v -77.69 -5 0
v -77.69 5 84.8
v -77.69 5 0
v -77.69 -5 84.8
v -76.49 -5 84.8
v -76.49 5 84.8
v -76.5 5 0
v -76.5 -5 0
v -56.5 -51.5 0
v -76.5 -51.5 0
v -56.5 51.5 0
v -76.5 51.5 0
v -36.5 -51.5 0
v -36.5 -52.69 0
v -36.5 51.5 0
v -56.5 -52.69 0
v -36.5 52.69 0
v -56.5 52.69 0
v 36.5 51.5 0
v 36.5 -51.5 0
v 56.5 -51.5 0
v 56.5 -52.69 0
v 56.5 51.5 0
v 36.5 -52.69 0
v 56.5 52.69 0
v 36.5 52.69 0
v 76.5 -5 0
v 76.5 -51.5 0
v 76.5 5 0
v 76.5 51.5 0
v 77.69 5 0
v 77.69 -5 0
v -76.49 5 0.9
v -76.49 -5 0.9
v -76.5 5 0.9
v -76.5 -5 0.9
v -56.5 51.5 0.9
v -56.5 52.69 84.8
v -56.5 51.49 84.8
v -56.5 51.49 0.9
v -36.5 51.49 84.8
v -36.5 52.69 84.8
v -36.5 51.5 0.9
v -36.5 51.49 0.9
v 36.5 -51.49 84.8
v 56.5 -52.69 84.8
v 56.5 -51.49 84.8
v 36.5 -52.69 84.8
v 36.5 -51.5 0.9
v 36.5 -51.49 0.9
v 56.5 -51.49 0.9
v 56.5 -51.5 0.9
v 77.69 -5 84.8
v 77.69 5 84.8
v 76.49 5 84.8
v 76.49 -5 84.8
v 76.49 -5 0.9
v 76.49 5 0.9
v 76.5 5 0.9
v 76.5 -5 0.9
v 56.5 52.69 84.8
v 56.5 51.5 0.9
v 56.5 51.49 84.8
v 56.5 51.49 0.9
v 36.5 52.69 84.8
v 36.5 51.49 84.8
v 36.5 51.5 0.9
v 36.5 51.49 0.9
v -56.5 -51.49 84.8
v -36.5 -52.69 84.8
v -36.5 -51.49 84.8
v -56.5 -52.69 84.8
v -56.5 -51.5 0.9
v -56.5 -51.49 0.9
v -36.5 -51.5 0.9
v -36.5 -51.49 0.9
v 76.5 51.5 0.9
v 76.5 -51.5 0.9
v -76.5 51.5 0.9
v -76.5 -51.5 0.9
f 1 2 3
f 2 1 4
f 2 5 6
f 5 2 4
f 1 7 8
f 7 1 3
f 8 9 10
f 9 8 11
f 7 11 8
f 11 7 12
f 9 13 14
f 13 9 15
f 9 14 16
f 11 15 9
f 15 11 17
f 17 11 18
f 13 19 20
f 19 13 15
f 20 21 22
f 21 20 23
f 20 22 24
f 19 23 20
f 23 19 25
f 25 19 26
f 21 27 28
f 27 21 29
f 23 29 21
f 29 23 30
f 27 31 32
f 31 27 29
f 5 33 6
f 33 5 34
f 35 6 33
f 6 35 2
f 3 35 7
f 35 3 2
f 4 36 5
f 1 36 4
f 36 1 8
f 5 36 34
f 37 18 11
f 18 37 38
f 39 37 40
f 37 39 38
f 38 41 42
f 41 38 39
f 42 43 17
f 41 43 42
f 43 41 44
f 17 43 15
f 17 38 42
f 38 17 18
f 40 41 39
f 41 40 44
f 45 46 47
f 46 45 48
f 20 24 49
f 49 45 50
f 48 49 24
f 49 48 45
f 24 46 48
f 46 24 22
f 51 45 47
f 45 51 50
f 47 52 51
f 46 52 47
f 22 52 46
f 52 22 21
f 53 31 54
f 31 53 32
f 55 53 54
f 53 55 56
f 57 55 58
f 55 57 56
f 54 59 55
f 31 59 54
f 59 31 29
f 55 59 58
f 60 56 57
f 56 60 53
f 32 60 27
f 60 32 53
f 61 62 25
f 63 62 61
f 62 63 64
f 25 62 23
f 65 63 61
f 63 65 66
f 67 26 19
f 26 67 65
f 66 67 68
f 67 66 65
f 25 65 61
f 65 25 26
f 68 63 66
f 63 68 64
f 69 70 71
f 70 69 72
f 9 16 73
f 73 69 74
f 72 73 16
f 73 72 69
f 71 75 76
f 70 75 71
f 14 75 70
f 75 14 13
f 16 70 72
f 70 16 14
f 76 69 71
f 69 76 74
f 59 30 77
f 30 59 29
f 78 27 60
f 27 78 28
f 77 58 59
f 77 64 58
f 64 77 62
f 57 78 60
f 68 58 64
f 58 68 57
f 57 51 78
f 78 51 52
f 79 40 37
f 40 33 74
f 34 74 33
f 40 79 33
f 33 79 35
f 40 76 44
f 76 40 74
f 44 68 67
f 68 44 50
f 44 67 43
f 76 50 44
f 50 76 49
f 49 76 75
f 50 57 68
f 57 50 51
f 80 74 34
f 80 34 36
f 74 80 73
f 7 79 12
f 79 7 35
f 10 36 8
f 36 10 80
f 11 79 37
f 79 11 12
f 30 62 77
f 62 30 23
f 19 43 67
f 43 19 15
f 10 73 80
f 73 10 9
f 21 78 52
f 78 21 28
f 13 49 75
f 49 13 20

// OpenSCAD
// -*- mode: SCAD ; c-file-style: "ellemtel" ; coding: utf-8 -*-
//
// correctly sized simple shape to stack four picture 135 type film strips
//
// © 2018 Roland Sieker <ospalh@gmail.com>
// Licence: CC-BY-SA 4.0


// … to preview. You will get all parts when you click “Create Thing”.
part = "stack"; // [stack: Stapler, lid: Deckel]

// Set this to “render” and click on “Create Thing” when done with the setup.
preview = 1; // [0:render, 1:preview]
// not needed


l1 = 150;
ex = 3;
num = 1;
lld = l1*num;
ll = lld + ex;
ey = 1;
w1 = 102;
wst = w1+ey; // 9.2 mm + clearance
wld = w1-ey; // Make it fit between the plates without problems

w = 1.2;  // Wall width

h = 83; // I have a lot of film strips i want to stack. I mean, a *lot*.
epl = 10;
spl = 20;
spo = 20;

/* [Hidden] */

// Done with the customizer

// *******************************************************
// Extra parameters. These can be changed reasonably safely.


p = 0.9;  // Bottom, top plate height
c = 0.4;  // Clearance
angle = 60; // Overhangs much below 60° are a problem for me

// *******************************************************
// Some shortcuts. These shouldn’t be changed

tau = 2 * PI;  // π is still wrong. τ = circumference ÷ r

xy_factor = 1/tan(angle);
// To get from a height to a horizontal width inclined correctly
z_factor = tan(angle);  // The other way around

he = h + 2*p;
spo2 = ll/2 - spo - spl;

some_distance = 50;
ms = 0.01;  // Muggeseggele.

// fn for differently sized objects and fs, fa; all for preview or rendering.
pna = 40;
pnb = 15;
pa = 5;
ps = 1;
rna = 180;
rnb = 30;
ra = 1;
rs = 0.1;
function na() = (preview) ? pna : rna;
function nb() = (preview) ? pnb : rnb;
$fs = (preview) ? ps : rs;
$fa = (preview) ? pa : ra;

// *******************************************************
// End setup



// *******************************************************
// Generate the parts

print_part();
// preview_parts();
// stack_parts();



module print_part()
{
   if ("stack" == part)
   {
      stack();
   }
   if ("lid" == part)
   {
      lid();
   }
}

module preview_parts()
{
   stack();
   translate([0, some_distance, 0])
   {
      lid();
   }
}

module stack_parts()
{
   // intersection()
   {
      color("yellow")
      {
         stack();
      }
      translate([0,0, 3*p])
      {
         color("red")
         {
            lid();
         }
      }
   }
}

// *******************************************************
// Code for the parts themselves

module stack()
{
   translate([0,0,p/2])
   {
      cube([ll, wst, p], center=true);
   }
   plates();
}


module lid()
{
   translate([0,0,p/2])
   {
      cube([lld, wld, p], center=true);
   }
}


module plates()
{
   end_plate();
   side_plate();
   rotate(180)
   {
      side_plate();
   }
   mirror()
   {
      end_plate();
      side_plate();
      rotate(180)
      {
         side_plate();
      }
   }
}

module end_plate()
{
   translate([ll/2-ms , -epl/2,0])
   {
      cube([w, epl, he]);
   }
}

module side_plate()
{
   translate([spo2, wst/2-ms,0])
   {
      cube([spl, w, he]);
   }
}
